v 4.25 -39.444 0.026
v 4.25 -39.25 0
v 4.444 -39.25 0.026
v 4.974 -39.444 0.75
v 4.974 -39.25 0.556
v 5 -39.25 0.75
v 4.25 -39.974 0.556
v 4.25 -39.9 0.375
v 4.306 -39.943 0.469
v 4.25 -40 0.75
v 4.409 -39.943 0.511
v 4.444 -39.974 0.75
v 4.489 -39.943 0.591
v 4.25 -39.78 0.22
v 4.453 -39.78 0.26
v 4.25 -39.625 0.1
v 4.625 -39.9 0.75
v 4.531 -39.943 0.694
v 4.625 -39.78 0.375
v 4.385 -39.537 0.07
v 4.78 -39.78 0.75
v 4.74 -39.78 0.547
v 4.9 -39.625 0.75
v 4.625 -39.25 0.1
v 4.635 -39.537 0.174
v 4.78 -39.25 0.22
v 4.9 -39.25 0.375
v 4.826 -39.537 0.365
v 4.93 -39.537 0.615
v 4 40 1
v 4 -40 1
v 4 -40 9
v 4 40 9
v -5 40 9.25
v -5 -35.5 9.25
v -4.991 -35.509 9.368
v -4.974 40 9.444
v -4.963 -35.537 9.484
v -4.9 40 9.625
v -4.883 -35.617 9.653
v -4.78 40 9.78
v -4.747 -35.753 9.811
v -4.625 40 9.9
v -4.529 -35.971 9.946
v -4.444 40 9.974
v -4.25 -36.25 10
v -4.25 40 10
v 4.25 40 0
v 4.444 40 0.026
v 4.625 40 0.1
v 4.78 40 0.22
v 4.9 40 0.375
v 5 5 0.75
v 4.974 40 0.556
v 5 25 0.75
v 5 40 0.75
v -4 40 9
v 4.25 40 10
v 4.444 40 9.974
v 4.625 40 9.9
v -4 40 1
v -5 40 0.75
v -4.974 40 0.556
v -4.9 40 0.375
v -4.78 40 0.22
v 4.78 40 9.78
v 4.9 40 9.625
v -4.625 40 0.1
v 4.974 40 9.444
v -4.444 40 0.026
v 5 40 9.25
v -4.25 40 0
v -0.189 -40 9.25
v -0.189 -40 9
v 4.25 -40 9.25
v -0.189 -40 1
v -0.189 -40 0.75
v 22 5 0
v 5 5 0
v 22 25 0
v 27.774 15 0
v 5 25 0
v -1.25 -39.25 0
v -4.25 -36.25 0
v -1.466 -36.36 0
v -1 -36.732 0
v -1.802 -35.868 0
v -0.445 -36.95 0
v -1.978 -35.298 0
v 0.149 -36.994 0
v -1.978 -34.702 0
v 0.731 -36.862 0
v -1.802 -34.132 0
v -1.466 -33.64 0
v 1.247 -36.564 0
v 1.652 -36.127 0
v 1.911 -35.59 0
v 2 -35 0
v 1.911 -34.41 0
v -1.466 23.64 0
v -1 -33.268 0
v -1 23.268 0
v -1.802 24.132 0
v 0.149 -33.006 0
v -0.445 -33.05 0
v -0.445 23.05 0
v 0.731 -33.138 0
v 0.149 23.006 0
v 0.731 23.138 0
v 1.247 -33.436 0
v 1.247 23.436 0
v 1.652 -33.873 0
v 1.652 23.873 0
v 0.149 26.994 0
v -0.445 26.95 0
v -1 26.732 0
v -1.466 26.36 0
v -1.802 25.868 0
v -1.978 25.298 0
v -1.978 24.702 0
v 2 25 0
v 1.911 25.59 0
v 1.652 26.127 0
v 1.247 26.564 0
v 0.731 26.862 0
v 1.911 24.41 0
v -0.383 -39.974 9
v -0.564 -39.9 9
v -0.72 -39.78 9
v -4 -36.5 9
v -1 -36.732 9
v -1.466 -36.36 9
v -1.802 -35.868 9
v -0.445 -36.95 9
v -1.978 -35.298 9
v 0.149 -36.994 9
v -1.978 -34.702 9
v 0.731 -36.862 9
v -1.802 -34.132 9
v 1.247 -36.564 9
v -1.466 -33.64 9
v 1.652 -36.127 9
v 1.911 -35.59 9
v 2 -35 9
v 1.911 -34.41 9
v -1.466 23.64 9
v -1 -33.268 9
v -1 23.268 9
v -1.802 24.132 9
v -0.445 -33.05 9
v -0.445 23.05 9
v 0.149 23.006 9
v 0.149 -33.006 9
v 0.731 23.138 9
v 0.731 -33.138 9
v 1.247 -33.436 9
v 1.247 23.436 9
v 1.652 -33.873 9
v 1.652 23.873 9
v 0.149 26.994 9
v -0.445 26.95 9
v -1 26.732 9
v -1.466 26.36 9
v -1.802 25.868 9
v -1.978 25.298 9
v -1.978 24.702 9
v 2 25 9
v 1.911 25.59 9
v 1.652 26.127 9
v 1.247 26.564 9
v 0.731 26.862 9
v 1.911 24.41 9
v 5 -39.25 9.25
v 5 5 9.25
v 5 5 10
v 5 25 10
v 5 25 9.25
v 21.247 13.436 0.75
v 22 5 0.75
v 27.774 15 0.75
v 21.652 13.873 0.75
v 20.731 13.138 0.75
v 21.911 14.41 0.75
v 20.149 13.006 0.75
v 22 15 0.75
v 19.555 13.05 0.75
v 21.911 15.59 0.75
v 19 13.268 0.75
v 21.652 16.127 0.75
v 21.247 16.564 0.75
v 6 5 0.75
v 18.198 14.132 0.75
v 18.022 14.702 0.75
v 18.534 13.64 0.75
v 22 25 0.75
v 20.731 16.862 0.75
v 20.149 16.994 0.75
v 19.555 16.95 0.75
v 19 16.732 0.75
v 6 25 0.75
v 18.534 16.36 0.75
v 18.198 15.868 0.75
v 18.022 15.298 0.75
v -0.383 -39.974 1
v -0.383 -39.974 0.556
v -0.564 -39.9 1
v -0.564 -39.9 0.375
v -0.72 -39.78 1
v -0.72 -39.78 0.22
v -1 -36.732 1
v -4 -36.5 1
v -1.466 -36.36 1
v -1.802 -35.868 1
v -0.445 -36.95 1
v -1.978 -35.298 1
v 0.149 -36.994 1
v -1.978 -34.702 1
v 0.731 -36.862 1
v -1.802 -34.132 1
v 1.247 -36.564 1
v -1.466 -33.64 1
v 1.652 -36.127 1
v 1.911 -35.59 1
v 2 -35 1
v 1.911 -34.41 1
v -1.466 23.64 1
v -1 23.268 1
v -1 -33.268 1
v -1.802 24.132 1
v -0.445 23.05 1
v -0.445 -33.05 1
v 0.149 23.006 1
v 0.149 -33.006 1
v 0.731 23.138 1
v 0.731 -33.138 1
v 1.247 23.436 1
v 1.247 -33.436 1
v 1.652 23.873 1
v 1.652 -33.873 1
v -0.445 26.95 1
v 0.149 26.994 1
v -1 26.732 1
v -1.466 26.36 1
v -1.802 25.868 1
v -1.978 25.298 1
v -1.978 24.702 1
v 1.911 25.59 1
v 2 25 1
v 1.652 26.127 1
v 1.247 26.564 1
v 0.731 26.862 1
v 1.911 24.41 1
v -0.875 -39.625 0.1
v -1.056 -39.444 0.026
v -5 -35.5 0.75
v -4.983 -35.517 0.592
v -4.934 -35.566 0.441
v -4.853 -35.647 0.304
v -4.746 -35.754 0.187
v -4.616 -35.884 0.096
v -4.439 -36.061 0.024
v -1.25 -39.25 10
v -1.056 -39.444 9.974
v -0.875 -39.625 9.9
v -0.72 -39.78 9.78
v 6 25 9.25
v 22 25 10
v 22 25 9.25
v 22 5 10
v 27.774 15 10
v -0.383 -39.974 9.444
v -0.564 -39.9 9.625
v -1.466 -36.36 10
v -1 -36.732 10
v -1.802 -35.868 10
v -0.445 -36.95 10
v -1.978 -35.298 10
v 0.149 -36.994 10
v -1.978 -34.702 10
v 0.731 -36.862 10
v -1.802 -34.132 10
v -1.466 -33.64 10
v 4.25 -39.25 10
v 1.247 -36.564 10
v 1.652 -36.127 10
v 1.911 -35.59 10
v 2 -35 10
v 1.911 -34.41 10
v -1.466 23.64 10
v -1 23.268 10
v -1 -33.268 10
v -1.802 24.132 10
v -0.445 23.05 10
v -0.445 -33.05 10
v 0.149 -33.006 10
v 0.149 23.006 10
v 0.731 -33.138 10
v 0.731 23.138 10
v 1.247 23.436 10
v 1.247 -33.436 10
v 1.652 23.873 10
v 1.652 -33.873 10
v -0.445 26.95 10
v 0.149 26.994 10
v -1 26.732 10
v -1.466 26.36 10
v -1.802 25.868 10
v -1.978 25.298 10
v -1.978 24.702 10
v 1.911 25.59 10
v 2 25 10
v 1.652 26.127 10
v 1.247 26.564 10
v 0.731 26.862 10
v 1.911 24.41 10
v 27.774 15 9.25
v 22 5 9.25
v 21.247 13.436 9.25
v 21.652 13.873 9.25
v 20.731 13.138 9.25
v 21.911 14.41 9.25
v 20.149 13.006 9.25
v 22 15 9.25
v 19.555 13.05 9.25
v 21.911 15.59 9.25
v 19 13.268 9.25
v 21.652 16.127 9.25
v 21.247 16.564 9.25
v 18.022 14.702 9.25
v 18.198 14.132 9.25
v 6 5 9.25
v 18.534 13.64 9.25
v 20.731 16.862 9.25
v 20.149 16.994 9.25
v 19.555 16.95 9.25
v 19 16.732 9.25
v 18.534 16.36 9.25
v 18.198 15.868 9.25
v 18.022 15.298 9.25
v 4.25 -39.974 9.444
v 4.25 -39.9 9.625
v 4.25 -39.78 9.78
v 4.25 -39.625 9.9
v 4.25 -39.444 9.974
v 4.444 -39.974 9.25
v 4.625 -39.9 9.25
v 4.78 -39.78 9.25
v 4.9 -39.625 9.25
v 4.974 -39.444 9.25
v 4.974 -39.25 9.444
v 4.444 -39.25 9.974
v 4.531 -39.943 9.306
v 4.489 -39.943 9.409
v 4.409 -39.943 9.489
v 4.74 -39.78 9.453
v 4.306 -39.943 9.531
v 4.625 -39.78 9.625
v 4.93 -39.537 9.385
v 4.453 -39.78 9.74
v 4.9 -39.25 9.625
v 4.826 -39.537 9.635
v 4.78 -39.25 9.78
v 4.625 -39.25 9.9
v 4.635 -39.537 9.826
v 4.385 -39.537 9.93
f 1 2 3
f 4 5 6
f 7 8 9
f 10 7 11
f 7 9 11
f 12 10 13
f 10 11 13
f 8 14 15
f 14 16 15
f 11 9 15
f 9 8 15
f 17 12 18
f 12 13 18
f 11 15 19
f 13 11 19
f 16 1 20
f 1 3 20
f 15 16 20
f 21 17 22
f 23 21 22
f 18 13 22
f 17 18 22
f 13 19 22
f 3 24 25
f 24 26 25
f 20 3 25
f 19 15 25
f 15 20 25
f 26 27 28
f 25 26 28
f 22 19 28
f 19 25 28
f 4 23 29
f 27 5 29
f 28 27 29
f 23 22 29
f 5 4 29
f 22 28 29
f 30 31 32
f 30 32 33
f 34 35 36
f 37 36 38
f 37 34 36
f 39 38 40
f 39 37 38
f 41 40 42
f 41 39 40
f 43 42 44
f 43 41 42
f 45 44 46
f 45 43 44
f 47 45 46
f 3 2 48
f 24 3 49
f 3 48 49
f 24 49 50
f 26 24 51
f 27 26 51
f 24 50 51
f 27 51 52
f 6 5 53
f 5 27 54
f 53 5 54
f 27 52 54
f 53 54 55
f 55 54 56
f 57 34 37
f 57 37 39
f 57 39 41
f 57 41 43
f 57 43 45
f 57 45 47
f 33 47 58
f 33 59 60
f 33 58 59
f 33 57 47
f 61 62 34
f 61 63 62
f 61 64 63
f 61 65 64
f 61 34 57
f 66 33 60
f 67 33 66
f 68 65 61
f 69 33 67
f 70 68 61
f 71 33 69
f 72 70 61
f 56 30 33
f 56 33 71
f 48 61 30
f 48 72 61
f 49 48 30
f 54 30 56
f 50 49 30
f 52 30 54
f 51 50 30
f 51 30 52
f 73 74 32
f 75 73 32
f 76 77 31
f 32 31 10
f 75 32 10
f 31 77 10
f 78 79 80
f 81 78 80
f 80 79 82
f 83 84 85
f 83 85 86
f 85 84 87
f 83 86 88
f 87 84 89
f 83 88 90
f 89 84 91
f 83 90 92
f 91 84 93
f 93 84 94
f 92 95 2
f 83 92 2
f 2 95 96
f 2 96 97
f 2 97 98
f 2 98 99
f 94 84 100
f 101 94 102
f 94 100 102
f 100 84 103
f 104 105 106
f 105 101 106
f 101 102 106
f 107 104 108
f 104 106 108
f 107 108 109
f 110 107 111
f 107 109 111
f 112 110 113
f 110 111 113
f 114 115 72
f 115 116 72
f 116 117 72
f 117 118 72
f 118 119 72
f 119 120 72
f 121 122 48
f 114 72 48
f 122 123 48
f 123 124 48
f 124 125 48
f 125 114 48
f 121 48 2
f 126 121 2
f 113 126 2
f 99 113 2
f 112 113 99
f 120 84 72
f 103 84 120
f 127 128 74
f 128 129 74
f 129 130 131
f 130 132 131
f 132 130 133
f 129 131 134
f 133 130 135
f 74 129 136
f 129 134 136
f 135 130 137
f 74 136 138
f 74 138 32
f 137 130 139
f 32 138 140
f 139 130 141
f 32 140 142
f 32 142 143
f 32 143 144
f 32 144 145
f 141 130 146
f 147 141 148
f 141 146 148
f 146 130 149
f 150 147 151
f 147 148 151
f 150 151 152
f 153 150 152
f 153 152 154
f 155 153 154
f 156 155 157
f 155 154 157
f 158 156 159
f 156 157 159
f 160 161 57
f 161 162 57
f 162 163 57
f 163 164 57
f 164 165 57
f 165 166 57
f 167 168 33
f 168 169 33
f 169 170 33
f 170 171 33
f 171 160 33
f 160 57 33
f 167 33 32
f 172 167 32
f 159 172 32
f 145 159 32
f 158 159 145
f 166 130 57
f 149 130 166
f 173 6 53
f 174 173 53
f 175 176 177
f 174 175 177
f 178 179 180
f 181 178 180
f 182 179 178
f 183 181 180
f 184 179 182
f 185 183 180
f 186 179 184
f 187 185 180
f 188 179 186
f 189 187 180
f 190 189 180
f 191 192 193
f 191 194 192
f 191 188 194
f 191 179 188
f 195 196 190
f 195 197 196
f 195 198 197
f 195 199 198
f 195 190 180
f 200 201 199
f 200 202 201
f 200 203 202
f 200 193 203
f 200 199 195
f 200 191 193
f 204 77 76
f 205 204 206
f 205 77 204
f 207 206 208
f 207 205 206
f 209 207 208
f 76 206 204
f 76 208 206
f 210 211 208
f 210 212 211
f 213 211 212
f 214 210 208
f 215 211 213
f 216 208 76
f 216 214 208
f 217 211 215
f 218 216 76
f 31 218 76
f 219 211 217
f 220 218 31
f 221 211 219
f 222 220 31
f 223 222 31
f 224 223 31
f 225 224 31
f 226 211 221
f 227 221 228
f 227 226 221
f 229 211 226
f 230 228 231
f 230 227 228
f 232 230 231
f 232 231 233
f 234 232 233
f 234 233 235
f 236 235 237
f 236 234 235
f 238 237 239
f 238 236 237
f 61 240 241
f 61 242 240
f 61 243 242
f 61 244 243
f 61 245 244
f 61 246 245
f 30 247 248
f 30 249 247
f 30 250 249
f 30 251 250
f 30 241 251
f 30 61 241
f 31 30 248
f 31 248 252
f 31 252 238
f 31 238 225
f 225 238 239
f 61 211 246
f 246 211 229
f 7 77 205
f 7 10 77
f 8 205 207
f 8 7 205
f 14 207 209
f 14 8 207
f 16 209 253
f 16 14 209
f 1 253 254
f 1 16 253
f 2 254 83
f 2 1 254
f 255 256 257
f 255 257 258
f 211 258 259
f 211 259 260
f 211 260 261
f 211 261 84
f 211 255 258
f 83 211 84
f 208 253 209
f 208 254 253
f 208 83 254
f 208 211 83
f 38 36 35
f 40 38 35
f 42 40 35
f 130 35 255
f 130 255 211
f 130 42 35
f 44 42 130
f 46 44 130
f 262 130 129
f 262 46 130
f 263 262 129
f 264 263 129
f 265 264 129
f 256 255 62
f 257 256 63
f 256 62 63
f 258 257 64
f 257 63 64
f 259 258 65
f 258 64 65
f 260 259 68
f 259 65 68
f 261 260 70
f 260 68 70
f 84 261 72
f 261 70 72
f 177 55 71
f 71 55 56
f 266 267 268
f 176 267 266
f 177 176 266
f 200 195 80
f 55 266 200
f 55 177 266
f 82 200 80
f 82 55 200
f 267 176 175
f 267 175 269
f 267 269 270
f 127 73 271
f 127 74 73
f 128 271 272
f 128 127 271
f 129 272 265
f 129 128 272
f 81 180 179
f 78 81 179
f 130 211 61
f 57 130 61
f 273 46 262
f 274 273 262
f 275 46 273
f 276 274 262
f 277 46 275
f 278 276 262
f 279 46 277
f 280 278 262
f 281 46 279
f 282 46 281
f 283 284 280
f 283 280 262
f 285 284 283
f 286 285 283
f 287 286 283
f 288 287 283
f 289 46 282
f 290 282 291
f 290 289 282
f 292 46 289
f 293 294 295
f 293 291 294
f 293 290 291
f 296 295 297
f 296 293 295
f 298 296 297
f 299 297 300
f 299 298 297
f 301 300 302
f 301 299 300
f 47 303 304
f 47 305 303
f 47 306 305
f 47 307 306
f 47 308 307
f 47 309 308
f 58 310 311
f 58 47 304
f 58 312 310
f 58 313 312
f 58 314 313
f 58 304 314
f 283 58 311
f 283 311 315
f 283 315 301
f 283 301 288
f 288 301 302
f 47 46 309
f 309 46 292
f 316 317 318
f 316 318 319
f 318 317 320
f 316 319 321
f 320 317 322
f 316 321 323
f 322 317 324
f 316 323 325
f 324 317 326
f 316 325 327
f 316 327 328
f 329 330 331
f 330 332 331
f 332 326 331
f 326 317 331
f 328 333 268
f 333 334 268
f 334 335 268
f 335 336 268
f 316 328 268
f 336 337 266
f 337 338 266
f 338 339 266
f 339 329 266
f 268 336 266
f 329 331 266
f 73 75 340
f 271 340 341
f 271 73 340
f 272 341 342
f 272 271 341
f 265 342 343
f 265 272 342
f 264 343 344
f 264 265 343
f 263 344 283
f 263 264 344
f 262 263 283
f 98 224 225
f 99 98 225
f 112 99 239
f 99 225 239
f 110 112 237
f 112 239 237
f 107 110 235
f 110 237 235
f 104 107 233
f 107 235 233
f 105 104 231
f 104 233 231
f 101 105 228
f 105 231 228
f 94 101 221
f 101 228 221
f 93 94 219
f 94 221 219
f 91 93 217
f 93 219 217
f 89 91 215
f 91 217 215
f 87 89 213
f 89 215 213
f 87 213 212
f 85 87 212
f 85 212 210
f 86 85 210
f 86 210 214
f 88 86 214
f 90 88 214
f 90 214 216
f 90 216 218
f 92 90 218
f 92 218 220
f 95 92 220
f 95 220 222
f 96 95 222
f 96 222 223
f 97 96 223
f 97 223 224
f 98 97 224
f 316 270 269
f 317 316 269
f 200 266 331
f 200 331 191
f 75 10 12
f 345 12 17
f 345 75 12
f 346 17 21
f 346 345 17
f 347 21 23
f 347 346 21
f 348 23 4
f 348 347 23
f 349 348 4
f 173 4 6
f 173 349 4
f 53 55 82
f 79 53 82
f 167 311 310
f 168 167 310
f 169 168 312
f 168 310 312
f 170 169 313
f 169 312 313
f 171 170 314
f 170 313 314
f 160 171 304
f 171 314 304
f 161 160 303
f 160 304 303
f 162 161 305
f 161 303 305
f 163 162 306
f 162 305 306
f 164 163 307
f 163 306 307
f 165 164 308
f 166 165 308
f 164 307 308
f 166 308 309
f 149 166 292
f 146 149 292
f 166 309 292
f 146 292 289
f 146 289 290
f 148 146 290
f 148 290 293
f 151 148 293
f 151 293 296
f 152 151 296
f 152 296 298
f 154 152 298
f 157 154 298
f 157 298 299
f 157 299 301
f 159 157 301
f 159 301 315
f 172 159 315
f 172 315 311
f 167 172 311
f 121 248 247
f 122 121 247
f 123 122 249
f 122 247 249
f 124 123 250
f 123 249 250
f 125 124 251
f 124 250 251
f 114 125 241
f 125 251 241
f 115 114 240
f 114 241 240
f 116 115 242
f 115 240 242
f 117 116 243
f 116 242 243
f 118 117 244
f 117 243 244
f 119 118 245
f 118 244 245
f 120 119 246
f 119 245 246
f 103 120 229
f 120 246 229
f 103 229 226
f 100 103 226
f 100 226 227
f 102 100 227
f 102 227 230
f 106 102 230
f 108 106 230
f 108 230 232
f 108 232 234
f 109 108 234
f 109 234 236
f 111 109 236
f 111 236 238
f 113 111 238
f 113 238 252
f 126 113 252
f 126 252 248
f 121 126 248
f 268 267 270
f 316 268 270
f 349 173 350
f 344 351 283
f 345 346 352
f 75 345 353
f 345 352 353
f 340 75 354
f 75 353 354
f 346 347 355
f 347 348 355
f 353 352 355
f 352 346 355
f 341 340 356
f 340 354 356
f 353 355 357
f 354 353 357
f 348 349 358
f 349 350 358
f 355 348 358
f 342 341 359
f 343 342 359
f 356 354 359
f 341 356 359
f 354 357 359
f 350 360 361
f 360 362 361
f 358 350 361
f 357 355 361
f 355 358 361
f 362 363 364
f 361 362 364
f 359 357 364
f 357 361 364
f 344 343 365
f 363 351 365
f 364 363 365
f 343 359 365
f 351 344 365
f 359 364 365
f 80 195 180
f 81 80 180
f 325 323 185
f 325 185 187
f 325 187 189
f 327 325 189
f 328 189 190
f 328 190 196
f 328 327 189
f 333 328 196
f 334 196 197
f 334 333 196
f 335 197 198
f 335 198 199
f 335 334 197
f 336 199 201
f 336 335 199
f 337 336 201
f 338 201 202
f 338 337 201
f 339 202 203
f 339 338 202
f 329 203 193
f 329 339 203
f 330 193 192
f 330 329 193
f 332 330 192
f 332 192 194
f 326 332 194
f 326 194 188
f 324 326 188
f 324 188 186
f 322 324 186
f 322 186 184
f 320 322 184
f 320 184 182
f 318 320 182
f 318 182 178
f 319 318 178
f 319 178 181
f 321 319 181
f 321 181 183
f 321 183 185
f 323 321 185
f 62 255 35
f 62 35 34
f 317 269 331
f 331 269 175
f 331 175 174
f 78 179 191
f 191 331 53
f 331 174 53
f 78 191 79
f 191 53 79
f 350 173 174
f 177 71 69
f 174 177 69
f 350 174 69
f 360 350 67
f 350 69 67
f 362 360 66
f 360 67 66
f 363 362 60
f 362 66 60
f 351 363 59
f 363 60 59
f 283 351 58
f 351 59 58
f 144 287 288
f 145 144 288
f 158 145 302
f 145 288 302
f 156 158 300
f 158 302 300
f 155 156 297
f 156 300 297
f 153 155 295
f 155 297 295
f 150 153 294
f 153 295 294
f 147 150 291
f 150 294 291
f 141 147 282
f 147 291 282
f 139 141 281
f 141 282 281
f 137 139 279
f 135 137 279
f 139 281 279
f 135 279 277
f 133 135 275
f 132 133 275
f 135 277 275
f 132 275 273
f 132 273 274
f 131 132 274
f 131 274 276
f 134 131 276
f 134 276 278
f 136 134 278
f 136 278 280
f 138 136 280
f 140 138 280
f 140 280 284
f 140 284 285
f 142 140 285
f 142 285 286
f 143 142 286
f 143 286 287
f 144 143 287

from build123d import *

# Parameters (mm, degrees)
SKETCH1_W           = 10
SKETCH1_H           = 80
BOSS_EXTRUDE1_DEPTH = 10
SHELL1_T            = -1
FILLET1_R           = 0.75
SKETCH2_W           = 8.5
SKETCH2_H           = 20
BOSS_EXTRUDE2_DEPTH = 1
SKETCH3_W           = 0.75
SKETCH3_H           = 20
BOSS_EXTRUDE3_DEPTH = 30
CUT_EXTRUDE1_DEPTH  = 35
SKETCH5_R           = 2
CUT_EXTRUDE2_DEPTH  = 35
FILLET2_R           = 0.75
SKETCH6_R           = 2
BOSS_EXTRUDE4_DEPTH = 10


with BuildPart() as part:
    # Sketch1 → Boss-Extrude1 (new body)
    with BuildSketch(Plane.XY):
        Rectangle(SKETCH1_W, SKETCH1_H)
    extrude(amount=BOSS_EXTRUDE1_DEPTH)

    # Shell1
    shell1_openings = [part.faces().sort_by_distance(p)[0] for p in [
        (0, -40, 5),
        (0, 40, 5),
    ]]
    offset(amount=SHELL1_T, openings=shell1_openings, kind=Kind.INTERSECTION)

    # Fillet1
    fillet1_edges = [part.edges().sort_by_distance(p)[0] for p in [
        (-5, 0, 10),
        (5, 0, 10),
        (-5, 0, 0),
        (5, 0, 0),
    ]]
    fillet(fillet1_edges, radius=FILLET1_R)

    # Sketch2 → Boss-Extrude2 (add)
    with BuildSketch(Plane(origin=(5, 0, 0), x_dir=(0, 0, -1), z_dir=(1, 0, 0))):
        with Locations((-5, 15)):
            Rectangle(SKETCH2_W, SKETCH2_H)
    extrude(amount=BOSS_EXTRUDE2_DEPTH)

    # Sketch3 → Boss-Extrude3 (add)
    with BuildSketch(Plane(origin=(5, 0, 0), x_dir=(0, 0, -1), z_dir=(1, 0, 0))):
        with Locations((-9.625, 15)):
            Rectangle(SKETCH3_W, SKETCH3_H)
        with Locations((-0.375, 15)):
            Rectangle(SKETCH3_W, SKETCH3_H)
    extrude(amount=BOSS_EXTRUDE3_DEPTH)

    # Sketch4 → Cut-Extrude1 (cut)
    with BuildSketch(Plane.XY.offset(10)):
        Polygon((22, 5), (35, 5), (35, 25), (22, 25), (27.773502692, 15), align=None)
    extrude(amount=-CUT_EXTRUDE1_DEPTH, mode=Mode.SUBTRACT)

    # Sketch5 → Cut-Extrude2 (cut)
    with BuildSketch(Plane.XY.offset(10)):
        with Locations((0, 25)):
            Circle(SKETCH5_R)
        with Locations((0, -35)):
            Circle(SKETCH5_R)
        Polygon((-5, -35.5), (-0.5, -40), (-5, -40), align=None)
    extrude(amount=-CUT_EXTRUDE2_DEPTH, mode=Mode.SUBTRACT)

    # Fillet2
    fillet2_edges = [part.edges().sort_by_distance(p)[0] for p in [
        (1.875, -40, 0),
        (1.875, -40, 10),
        (-0.5, -40, 9.5),
        (-0.5, -40, 0.5),
        (5, -40, 5),
        (4.780330086, -40, 0.219669914),
        (4.780330086, -40, 9.780330086),
    ]]
    fillet(fillet2_edges, radius=FILLET2_R)

    # Sketch6 → Boss-Extrude4 (add)
    with BuildSketch(Plane.XY.offset(10)):
        with Locations((20, 15)):
            Circle(SKETCH6_R)
    extrude(amount=-BOSS_EXTRUDE4_DEPTH)


solid = part.part
